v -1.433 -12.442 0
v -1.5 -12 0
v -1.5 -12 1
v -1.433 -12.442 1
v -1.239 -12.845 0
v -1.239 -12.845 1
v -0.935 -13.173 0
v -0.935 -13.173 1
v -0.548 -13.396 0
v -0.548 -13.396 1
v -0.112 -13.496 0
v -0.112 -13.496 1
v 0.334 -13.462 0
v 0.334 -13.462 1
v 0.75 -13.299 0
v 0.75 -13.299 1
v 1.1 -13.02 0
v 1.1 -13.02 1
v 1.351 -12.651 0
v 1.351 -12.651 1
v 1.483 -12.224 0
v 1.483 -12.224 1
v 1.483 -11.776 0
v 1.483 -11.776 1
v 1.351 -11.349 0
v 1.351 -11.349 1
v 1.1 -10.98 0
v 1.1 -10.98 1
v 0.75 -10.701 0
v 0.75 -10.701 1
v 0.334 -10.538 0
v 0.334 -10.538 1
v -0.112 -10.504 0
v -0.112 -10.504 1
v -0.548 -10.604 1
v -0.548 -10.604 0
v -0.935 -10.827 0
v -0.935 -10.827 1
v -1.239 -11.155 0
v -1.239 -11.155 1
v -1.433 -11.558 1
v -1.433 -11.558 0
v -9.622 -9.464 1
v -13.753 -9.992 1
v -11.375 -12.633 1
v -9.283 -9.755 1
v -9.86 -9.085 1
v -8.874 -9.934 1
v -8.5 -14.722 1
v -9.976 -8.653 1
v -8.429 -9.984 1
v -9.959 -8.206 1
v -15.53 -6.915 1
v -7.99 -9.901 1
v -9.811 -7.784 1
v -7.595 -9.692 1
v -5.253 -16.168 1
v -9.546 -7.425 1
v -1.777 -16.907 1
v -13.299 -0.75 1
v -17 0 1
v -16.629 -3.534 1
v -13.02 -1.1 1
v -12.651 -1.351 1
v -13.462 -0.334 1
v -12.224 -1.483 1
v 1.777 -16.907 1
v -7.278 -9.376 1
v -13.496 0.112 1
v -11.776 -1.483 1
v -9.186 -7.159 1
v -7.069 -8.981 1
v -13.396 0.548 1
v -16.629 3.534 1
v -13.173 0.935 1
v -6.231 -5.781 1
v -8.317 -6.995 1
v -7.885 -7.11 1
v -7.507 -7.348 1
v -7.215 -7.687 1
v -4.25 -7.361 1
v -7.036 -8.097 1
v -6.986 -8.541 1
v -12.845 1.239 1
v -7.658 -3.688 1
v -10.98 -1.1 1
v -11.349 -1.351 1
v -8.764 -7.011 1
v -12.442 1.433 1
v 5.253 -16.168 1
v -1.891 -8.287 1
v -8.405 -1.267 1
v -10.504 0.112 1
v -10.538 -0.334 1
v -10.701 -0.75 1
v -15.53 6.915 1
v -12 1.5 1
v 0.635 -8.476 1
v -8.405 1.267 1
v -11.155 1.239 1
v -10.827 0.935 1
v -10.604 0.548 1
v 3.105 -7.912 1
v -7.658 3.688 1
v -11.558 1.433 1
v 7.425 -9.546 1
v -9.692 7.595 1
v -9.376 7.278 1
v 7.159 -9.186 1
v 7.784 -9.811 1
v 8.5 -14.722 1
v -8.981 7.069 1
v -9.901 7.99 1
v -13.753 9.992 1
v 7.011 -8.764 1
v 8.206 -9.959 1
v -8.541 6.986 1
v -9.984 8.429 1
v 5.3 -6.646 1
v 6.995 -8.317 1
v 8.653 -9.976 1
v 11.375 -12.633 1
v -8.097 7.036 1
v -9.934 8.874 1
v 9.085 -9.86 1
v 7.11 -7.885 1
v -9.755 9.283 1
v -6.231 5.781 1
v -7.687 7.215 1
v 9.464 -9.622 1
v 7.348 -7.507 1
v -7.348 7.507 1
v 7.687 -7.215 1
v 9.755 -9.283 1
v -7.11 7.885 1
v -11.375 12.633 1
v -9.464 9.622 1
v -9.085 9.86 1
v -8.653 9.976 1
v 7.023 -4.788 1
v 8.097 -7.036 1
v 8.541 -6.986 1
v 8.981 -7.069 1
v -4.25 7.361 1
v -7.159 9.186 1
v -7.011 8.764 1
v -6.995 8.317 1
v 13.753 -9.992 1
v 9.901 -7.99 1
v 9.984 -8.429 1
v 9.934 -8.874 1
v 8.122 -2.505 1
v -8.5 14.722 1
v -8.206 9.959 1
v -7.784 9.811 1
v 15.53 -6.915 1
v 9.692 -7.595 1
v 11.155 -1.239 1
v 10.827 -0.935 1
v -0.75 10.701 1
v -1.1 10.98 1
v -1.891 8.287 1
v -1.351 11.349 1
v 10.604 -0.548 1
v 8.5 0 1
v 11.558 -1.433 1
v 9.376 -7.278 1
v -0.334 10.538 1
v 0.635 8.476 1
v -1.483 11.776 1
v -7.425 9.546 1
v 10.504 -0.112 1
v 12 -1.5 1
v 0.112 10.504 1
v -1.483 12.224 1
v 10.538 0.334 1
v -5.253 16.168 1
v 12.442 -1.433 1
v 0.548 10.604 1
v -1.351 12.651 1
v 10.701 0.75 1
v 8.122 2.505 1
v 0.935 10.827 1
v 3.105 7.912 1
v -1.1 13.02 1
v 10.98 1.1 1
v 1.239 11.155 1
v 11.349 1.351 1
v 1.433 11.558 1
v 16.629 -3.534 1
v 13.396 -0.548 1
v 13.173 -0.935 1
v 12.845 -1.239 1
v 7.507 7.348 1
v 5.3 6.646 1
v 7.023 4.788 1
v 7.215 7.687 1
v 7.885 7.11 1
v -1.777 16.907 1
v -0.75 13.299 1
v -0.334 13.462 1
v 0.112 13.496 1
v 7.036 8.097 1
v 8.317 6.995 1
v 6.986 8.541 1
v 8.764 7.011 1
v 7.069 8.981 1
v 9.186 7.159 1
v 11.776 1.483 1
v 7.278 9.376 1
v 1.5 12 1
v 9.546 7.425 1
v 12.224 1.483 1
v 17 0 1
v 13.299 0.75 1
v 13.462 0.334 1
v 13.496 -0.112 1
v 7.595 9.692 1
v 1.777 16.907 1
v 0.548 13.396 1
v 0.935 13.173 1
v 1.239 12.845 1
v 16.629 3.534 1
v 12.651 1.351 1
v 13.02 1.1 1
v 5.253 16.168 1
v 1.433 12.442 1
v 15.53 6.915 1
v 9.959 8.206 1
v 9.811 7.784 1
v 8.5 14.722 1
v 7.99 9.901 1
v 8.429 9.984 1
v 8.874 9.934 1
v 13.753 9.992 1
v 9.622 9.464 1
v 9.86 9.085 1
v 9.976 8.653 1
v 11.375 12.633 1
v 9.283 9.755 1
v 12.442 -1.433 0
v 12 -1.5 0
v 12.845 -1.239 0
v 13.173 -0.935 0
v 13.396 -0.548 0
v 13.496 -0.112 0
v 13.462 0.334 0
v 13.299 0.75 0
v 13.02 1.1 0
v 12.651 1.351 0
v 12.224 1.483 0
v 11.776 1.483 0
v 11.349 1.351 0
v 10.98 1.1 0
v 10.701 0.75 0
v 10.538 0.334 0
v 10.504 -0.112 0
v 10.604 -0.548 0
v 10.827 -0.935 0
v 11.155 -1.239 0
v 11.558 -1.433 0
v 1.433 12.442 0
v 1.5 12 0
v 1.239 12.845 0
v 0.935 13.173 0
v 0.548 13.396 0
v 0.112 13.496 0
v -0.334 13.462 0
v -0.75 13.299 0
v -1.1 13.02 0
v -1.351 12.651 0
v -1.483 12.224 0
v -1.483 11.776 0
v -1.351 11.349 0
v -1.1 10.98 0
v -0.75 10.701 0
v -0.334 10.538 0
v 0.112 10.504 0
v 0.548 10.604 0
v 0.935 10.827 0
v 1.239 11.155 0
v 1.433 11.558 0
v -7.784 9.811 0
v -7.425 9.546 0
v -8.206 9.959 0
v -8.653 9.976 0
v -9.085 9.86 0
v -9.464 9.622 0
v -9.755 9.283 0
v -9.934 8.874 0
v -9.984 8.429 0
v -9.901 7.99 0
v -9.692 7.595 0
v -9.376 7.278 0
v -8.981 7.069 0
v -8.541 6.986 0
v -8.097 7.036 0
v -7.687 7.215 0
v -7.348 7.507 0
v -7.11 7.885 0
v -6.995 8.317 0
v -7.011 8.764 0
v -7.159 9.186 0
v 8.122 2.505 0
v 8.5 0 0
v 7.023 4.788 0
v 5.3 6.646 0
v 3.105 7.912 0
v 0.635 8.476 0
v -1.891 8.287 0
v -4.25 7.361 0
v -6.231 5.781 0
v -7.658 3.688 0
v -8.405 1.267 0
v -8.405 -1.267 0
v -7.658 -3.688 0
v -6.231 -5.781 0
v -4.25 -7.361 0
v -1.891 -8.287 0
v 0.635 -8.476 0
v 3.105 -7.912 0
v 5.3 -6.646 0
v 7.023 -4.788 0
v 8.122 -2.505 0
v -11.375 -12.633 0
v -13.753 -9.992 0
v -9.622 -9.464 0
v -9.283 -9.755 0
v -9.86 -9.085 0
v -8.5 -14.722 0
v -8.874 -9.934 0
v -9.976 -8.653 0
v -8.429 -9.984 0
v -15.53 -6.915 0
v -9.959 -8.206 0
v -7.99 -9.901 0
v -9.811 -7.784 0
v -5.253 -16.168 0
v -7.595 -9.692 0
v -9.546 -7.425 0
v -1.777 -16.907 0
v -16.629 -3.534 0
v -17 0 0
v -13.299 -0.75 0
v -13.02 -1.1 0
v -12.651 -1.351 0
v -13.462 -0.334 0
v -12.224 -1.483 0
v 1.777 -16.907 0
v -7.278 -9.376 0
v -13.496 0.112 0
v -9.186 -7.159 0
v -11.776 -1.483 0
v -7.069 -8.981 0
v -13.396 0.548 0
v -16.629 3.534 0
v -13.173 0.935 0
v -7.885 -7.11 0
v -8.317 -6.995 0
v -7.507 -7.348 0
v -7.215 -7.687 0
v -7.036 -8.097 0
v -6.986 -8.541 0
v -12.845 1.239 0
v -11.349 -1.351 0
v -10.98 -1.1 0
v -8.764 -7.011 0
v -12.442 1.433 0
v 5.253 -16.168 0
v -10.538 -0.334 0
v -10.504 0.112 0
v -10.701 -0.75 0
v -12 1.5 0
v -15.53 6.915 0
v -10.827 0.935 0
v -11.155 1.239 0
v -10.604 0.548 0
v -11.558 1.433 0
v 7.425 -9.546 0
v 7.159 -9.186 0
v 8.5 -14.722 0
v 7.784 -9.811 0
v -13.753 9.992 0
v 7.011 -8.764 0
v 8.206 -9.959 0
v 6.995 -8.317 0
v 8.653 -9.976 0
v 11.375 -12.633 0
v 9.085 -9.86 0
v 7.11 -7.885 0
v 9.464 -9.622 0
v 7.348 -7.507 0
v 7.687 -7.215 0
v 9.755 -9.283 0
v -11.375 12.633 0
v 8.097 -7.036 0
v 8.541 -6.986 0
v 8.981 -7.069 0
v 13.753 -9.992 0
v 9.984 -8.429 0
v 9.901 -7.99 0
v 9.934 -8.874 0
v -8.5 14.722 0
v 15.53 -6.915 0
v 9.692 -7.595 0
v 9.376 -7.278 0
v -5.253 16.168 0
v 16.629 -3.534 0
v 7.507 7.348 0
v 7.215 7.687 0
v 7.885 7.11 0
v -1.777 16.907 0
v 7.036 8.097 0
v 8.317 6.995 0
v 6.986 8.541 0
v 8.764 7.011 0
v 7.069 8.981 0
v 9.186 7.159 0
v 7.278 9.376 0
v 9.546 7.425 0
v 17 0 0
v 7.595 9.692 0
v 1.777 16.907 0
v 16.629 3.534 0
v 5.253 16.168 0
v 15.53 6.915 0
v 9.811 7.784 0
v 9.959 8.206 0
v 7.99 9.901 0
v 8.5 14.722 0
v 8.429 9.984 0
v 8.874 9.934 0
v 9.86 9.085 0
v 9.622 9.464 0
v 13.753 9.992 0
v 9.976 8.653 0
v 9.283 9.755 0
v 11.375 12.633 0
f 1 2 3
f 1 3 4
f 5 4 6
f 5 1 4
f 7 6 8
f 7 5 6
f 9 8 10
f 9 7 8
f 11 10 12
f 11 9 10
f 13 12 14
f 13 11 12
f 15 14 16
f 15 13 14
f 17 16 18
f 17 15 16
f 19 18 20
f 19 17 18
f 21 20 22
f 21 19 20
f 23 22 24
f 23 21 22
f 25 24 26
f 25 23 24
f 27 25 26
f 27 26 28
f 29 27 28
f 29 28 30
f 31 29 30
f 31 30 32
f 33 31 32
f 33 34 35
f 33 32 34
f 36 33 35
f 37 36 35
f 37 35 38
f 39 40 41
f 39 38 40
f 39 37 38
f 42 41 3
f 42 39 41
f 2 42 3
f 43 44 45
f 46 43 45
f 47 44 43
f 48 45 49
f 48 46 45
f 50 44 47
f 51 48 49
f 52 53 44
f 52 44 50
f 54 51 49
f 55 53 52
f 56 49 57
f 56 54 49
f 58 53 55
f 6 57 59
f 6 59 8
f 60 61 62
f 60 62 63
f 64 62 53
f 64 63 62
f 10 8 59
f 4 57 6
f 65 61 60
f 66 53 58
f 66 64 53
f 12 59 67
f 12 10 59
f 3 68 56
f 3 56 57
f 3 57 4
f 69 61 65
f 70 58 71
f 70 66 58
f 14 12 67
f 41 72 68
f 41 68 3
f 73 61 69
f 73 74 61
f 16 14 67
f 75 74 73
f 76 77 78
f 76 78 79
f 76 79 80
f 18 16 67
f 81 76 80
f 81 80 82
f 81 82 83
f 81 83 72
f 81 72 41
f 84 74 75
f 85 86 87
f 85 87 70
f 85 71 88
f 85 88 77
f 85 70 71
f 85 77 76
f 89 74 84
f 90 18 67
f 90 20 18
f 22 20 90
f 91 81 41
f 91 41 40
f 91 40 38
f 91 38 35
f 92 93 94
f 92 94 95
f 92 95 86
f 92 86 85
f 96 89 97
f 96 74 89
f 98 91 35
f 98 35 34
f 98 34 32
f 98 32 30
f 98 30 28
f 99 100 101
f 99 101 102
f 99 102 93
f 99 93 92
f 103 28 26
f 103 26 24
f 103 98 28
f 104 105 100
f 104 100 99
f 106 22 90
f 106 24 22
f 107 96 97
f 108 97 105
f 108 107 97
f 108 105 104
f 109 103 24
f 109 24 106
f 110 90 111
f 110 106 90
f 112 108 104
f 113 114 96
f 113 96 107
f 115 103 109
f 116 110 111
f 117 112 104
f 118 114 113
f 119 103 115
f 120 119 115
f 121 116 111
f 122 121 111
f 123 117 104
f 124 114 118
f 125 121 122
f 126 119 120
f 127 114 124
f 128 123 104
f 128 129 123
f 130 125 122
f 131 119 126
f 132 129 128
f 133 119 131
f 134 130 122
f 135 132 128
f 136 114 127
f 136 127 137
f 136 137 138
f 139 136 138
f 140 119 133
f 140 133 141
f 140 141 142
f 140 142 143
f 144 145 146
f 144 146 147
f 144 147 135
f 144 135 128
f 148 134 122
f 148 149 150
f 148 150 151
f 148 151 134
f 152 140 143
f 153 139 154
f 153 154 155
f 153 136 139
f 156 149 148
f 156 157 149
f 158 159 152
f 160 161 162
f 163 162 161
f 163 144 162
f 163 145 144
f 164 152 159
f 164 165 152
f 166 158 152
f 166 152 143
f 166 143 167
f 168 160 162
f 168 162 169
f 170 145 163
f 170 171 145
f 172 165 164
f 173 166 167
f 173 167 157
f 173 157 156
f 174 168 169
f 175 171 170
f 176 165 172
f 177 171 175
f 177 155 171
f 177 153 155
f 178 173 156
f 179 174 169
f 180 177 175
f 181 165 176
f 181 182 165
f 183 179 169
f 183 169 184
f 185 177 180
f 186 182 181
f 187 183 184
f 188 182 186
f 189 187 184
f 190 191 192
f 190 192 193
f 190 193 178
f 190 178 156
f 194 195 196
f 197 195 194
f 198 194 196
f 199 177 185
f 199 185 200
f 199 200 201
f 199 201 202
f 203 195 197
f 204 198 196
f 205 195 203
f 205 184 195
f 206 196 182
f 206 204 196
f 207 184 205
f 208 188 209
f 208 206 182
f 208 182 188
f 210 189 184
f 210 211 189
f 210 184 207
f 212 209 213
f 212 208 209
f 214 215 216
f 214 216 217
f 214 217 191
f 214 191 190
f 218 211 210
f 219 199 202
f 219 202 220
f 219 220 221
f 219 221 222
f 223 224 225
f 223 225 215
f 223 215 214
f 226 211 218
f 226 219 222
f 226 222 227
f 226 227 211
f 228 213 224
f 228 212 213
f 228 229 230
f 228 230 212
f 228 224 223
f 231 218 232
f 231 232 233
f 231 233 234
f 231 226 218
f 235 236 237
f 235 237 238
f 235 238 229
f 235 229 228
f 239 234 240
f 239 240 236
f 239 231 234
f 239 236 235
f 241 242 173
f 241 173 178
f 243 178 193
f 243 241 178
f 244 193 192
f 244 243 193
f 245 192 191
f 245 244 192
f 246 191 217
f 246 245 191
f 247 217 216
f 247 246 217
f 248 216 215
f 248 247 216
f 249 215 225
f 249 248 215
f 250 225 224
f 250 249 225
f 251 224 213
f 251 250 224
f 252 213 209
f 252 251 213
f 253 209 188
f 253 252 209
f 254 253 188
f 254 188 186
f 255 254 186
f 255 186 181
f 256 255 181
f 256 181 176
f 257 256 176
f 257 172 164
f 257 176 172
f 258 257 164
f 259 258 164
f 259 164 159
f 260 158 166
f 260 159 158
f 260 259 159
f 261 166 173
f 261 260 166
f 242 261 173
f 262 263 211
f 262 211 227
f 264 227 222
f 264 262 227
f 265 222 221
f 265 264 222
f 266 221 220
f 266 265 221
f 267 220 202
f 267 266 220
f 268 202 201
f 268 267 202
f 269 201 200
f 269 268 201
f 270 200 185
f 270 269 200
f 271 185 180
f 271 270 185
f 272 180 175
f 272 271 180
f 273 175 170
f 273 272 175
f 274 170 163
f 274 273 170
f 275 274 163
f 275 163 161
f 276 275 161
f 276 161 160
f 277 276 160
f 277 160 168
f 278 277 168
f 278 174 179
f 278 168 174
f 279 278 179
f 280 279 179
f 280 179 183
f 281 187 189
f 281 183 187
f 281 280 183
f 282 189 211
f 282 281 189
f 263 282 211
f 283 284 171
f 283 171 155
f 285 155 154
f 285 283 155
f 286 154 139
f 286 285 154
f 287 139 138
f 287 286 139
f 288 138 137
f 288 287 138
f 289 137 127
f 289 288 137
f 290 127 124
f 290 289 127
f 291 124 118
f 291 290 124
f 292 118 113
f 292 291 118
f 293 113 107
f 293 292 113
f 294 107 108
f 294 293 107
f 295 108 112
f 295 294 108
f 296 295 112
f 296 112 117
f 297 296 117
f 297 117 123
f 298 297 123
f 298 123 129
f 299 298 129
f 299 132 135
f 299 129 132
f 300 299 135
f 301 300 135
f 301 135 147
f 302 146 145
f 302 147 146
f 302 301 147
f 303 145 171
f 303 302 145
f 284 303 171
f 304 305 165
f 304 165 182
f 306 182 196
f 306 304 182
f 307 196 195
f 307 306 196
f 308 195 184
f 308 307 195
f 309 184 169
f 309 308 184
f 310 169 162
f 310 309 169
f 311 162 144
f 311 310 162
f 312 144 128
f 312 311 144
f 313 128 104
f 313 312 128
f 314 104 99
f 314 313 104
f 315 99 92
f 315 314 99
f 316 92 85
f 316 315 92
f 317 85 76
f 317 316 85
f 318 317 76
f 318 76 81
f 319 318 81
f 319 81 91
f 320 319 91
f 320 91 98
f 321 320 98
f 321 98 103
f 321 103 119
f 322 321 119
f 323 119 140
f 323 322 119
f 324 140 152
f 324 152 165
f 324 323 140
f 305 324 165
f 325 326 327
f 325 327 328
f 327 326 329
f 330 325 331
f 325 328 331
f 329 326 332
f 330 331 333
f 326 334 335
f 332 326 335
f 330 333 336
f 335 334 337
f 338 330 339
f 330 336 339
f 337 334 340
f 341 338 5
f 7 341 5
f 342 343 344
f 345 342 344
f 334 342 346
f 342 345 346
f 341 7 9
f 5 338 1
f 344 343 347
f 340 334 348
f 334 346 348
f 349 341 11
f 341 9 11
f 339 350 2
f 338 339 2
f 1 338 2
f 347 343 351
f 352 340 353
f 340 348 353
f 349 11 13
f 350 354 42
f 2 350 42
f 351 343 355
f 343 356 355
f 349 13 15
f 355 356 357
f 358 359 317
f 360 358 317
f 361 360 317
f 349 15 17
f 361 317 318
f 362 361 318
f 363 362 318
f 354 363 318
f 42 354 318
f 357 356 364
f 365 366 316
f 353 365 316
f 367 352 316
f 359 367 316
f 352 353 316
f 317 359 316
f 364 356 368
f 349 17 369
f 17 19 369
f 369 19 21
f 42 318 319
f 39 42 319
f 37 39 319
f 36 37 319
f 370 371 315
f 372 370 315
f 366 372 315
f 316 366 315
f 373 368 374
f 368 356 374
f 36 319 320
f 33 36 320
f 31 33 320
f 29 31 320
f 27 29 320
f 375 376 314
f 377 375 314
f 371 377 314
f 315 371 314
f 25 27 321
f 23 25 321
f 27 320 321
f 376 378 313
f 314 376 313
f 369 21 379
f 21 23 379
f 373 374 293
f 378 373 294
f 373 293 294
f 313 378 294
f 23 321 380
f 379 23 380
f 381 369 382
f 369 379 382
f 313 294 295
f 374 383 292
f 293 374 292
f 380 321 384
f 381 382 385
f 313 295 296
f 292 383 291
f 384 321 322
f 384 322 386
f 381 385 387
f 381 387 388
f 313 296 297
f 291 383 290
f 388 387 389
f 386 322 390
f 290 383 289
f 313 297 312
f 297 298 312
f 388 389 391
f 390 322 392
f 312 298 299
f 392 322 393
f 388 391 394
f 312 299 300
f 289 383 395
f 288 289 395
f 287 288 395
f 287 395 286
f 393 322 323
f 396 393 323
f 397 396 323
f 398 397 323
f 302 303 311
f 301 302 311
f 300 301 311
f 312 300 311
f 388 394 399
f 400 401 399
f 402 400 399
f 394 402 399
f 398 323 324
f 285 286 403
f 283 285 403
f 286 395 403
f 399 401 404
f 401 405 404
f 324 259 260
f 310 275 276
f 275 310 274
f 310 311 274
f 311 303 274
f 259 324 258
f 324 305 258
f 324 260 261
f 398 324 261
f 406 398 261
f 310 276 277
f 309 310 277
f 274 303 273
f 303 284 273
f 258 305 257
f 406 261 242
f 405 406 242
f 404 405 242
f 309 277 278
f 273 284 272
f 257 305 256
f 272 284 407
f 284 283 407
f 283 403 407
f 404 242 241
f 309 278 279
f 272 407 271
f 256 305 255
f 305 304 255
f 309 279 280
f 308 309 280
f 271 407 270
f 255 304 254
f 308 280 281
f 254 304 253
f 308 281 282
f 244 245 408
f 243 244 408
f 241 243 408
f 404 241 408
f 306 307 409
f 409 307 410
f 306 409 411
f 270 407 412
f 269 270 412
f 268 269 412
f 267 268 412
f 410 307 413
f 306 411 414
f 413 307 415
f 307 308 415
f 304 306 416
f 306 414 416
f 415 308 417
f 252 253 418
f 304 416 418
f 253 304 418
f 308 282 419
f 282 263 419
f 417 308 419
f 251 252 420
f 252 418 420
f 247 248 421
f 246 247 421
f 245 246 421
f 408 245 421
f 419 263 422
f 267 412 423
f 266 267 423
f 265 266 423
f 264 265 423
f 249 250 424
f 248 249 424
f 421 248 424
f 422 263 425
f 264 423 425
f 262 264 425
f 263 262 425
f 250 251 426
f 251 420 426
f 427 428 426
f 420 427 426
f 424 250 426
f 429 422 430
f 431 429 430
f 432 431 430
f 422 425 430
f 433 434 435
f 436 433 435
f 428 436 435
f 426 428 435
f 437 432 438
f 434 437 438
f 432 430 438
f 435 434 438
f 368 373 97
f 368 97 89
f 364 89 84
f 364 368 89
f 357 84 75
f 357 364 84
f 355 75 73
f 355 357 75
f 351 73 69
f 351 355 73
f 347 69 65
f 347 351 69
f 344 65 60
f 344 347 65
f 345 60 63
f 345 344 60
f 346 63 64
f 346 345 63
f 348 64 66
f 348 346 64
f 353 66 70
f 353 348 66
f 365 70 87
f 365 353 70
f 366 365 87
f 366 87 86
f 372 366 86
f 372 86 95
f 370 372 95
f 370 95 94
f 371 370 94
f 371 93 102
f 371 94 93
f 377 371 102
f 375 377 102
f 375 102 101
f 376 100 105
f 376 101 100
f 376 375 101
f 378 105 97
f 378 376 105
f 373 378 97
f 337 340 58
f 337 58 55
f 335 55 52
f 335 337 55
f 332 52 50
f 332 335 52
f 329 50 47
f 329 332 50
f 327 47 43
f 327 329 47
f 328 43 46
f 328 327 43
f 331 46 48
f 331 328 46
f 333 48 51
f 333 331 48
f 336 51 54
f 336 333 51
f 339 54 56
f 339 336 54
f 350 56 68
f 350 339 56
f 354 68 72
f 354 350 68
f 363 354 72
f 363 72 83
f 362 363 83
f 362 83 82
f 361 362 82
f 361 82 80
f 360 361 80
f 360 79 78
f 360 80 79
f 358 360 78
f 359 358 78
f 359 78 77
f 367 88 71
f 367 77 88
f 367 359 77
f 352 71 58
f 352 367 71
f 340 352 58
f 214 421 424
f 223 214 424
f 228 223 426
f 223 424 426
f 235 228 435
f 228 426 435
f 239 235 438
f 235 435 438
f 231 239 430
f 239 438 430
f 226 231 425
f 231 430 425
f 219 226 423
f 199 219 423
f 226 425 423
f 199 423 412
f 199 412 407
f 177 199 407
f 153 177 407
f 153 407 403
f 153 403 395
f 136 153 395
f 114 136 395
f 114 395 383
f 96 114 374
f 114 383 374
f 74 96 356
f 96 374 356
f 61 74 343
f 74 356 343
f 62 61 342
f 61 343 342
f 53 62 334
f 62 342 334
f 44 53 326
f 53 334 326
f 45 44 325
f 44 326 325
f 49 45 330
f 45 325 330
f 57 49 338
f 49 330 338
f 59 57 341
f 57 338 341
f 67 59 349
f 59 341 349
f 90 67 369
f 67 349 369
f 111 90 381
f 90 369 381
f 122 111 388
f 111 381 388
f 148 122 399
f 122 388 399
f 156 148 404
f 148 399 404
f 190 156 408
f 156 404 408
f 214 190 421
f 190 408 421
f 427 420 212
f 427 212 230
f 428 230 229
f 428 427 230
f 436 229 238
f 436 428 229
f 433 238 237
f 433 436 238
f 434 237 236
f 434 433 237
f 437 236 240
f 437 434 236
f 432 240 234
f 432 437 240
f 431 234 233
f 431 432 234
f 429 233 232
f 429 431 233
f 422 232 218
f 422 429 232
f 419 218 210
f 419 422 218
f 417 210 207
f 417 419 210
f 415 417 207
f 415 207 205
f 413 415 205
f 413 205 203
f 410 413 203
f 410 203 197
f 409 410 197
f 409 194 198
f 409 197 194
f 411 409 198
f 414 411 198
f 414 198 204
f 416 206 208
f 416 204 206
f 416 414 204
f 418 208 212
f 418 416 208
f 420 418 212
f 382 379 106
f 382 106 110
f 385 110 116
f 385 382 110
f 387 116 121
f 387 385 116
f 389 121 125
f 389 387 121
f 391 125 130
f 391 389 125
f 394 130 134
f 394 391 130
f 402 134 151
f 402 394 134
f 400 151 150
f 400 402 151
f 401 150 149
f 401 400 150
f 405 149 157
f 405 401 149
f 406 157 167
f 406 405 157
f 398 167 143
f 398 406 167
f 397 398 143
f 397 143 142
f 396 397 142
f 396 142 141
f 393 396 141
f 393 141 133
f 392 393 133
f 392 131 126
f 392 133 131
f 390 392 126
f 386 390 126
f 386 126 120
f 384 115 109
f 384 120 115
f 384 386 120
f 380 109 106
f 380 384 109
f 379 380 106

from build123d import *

# Parameters (mm, degrees)
SKETCH1_R           = 17
SKETCH1_R_2         = 8.5
BOSS_EXTRUDE1_DEPTH = 1
CUT_EXTRUDE1_START  = -2
SKETCH2_R           = 1.5
CUT_EXTRUDE1_DEPTH  = 3
CIRPATTERN1_COUNT   = 8


with BuildPart() as part:
    # Sketch1 → Boss-Extrude1 (new body)
    with BuildSketch(Plane.XY):
        Circle(SKETCH1_R)
        Circle(SKETCH1_R_2, mode=Mode.SUBTRACT)
    extrude(amount=BOSS_EXTRUDE1_DEPTH)

    # Sketch2 → Cut-Extrude1 (cut)
    with BuildSketch(Plane.XY.offset(1).offset(CUT_EXTRUDE1_START)):
        with Locations((0, 12)):
            Circle(SKETCH2_R)
    cut_extrude1 = extrude(amount=CUT_EXTRUDE1_DEPTH, mode=Mode.SUBTRACT)

    # CirPattern1: Cut-Extrude1 ×8 about axis
    cirpattern1_axis = Axis((0, 0, 0), (0, 0, 1))
    for i in range(1, CIRPATTERN1_COUNT):
        add(cut_extrude1.rotate(cirpattern1_axis, i * 360 / CIRPATTERN1_COUNT), mode=Mode.SUBTRACT)


solid = part.part
